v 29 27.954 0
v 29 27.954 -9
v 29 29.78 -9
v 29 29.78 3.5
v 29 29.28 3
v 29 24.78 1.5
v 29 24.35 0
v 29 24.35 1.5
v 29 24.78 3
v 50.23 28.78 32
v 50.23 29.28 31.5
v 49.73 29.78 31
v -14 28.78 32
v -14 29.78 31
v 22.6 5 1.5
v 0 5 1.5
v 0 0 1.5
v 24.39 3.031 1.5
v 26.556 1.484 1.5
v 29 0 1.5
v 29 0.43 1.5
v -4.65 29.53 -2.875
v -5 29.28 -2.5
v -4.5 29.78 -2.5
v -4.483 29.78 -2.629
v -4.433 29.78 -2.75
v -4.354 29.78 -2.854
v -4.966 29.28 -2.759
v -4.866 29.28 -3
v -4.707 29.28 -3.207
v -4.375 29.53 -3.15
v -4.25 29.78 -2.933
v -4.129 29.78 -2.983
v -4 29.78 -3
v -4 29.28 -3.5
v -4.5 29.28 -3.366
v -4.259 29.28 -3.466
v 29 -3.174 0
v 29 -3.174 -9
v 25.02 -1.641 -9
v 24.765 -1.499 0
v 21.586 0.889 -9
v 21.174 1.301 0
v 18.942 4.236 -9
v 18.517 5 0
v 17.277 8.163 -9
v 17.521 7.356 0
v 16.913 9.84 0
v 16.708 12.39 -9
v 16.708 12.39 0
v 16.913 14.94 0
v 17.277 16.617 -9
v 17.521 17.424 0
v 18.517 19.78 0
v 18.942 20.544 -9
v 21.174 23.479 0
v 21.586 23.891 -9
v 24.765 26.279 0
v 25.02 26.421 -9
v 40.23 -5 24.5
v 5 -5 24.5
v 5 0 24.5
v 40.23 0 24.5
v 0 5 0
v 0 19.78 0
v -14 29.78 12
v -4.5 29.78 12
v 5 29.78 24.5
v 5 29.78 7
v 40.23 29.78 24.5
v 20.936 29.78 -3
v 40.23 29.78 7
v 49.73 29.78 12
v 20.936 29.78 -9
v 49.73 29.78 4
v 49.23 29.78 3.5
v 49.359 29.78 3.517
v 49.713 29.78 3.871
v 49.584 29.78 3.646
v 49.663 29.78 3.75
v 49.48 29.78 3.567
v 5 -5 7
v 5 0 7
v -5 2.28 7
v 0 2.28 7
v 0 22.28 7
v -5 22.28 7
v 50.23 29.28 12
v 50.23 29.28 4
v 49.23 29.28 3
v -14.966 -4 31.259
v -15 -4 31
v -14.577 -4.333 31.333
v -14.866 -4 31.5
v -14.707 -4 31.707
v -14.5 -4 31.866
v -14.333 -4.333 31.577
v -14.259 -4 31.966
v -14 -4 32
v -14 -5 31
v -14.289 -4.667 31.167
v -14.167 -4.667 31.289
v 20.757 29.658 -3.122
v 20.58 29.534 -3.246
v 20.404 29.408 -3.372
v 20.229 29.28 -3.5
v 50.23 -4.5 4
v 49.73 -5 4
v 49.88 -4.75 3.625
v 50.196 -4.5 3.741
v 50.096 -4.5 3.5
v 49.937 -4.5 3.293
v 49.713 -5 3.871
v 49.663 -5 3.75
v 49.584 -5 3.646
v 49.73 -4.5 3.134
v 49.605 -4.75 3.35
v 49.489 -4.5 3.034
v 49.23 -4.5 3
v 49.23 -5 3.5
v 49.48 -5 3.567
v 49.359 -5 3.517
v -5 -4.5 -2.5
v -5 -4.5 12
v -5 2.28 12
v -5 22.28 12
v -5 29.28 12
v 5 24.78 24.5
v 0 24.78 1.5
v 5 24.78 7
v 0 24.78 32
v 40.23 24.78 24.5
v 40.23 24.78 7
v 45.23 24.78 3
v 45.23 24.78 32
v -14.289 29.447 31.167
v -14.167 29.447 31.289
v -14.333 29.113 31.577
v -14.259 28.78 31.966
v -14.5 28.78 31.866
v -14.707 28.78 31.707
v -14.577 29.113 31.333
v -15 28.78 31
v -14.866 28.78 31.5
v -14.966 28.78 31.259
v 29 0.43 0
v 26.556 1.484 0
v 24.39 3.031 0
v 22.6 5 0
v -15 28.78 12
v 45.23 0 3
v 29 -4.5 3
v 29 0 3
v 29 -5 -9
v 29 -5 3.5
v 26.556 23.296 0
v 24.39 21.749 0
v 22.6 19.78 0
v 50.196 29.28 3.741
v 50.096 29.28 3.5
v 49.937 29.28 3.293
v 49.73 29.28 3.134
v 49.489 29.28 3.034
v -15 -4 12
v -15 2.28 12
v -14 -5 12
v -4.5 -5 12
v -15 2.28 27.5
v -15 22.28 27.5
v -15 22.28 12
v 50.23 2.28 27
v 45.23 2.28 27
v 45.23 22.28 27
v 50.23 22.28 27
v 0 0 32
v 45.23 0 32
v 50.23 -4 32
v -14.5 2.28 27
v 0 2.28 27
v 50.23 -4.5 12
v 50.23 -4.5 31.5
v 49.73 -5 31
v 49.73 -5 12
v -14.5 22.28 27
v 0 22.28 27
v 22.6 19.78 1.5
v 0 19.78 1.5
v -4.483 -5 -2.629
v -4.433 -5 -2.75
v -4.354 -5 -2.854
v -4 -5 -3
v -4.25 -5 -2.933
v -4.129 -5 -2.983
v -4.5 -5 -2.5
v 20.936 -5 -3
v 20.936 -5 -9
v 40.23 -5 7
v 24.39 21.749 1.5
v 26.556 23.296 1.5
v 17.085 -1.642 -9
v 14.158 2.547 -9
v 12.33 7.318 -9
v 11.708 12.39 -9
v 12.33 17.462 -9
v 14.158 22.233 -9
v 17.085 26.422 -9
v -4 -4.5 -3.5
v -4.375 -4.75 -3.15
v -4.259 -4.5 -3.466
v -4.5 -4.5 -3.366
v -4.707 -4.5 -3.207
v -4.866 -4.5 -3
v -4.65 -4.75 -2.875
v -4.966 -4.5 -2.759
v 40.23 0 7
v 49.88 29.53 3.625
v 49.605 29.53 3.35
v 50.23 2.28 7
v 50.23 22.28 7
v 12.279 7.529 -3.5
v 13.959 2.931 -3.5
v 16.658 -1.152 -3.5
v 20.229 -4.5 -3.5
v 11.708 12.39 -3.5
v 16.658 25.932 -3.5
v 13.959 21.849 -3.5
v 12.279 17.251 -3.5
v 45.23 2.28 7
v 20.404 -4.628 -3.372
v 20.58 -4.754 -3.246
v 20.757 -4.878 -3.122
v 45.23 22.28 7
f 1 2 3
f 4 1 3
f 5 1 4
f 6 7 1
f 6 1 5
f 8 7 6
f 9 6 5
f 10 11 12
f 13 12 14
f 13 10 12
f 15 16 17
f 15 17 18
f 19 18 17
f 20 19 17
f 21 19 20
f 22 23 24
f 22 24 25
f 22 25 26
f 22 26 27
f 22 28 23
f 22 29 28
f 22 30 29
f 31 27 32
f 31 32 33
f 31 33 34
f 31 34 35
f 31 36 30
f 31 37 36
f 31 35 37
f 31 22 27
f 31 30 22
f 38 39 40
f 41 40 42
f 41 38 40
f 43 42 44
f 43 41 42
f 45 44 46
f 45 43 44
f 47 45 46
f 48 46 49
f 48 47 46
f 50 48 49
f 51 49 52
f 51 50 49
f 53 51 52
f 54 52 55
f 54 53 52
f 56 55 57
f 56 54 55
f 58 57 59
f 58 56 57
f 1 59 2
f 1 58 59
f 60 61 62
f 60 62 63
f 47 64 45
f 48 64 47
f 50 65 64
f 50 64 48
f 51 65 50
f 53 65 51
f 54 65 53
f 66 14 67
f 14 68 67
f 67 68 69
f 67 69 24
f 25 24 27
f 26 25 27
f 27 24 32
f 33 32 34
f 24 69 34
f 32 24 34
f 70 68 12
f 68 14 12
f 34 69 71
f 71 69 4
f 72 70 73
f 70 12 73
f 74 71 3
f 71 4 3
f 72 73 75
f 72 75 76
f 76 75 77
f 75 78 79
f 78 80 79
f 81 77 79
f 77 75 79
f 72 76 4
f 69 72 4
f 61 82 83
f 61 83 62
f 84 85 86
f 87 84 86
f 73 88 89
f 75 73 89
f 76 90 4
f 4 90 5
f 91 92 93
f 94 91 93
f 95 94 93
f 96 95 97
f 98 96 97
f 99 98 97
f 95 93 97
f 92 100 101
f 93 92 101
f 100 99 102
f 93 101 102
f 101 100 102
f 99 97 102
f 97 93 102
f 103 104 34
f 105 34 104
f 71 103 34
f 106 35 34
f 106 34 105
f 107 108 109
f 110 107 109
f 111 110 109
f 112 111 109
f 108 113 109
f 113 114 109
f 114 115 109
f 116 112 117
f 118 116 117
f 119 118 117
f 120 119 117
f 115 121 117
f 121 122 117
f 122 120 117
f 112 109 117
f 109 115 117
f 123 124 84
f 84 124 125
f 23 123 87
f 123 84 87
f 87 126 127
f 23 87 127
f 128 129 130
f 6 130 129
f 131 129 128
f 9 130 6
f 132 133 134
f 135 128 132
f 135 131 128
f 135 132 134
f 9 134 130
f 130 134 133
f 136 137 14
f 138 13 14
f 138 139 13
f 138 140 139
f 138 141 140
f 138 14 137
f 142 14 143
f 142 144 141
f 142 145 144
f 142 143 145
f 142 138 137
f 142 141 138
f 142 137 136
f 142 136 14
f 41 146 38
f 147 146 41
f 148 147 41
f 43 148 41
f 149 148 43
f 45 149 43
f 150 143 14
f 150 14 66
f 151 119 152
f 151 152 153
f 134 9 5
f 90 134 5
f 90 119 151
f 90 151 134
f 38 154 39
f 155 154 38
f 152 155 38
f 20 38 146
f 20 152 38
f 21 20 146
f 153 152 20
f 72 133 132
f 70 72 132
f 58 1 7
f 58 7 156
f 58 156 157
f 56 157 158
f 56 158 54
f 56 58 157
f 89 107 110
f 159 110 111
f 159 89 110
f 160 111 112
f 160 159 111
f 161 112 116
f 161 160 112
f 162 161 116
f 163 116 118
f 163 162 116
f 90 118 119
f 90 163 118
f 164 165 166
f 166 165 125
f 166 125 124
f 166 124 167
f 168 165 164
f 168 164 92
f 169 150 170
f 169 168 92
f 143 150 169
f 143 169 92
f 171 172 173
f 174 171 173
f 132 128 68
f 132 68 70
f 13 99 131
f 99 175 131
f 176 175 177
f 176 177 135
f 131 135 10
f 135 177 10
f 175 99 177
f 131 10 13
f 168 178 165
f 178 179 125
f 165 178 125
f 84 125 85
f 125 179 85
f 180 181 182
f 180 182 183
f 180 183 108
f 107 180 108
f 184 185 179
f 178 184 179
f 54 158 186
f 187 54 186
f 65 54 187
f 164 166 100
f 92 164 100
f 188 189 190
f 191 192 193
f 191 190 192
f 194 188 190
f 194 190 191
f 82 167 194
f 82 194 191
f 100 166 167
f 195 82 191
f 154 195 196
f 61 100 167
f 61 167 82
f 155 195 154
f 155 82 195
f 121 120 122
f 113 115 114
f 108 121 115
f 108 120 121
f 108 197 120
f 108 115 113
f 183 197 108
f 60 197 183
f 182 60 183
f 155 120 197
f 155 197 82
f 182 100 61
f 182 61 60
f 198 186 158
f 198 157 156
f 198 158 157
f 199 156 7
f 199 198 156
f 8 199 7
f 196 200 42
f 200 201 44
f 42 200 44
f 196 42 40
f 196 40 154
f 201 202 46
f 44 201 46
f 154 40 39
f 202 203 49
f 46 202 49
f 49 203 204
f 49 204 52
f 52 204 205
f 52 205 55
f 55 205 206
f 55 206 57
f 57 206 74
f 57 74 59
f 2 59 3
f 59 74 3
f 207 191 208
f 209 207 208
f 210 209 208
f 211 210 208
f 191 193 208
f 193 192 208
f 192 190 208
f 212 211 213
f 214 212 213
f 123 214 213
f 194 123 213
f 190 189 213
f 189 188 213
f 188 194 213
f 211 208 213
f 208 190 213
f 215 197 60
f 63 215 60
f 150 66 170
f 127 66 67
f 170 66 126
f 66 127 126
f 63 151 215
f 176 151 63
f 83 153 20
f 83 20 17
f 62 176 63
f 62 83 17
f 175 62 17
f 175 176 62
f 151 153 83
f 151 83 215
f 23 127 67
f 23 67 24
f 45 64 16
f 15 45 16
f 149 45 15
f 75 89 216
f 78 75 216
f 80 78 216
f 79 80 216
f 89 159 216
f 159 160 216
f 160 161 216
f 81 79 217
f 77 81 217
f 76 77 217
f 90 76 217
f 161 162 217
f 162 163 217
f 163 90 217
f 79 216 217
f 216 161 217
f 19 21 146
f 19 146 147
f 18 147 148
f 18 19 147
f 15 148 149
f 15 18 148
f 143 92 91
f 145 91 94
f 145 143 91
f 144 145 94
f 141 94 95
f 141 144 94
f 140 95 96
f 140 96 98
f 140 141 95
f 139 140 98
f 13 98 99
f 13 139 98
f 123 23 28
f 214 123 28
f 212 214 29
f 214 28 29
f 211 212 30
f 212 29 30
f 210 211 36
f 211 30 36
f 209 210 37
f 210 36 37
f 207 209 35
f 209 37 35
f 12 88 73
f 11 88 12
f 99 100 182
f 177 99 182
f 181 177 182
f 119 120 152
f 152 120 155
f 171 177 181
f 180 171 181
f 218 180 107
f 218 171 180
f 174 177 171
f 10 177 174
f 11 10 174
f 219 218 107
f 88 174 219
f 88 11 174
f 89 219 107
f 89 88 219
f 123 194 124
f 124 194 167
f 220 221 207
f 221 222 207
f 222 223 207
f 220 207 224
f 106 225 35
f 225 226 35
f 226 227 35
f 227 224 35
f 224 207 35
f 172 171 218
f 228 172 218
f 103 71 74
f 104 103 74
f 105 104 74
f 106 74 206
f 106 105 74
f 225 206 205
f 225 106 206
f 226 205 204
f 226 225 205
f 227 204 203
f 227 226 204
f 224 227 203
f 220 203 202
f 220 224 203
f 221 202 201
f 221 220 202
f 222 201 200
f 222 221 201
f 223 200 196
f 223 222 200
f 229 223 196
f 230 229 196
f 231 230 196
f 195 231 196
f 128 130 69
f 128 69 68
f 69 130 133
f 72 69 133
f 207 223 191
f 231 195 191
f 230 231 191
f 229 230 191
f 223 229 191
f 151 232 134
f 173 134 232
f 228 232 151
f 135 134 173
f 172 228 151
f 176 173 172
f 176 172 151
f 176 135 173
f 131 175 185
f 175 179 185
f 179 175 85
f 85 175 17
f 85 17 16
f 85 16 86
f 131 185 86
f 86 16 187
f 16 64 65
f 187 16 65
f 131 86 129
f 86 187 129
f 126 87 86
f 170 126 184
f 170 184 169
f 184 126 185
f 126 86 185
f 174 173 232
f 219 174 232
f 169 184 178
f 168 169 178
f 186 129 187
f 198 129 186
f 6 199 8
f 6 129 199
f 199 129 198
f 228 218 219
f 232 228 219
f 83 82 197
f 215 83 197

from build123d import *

# Parameters (mm, degrees)
SKETCH_1_W              = 45.23
SKETCH_1_H              = 24.78
EXTRUDE_1_DEPTH         = 35
CUT_EXTRUDE_1_DEPTH     = 3
SKETCH_5_W              = 1.897849624
SKETCH_5_H              = 24.78
CUT_EXTRUDE_3_DEPTH     = 3
EXTRUDE_2_DEPTH         = 17.9
EXTRUDE_2_DEPTH_BACK    = 18.6
EXTRUDE_2_START         = 17.5
SKETCH_3_R              = 3
SKETCH_4_W              = 30.897849624
SKETCH_4_H              = 5
CUT_EXTRUDE_2_DEPTH     = 1.5
SKETCH_6_W              = 10
SKETCH_6_H              = 18
CUT_EXTRUDE_4_DEPTH     = 1.5
SHELL_START             = -5
SHELL_12_DEPTH          = 5
SHELL_START_2           = 45.23
SHELL_12_2_OUTLINE_W    = 34.78
SHELL_12_2_OUTLINE_H    = 39
SHELL_12_2_DEPTH        = 5
SHELL_12_3_OUTLINE_W    = 34.78
SHELL_12_3_OUTLINE_H    = 1.5
SHELL_12_3_DEPTH        = 34
SHELL_12_4_OUTLINE_W    = 28
SHELL_12_4_OUTLINE_H    = 1.5
SHELL_12_4_DEPTH        = 20
SHELL_12_5_OUTLINE_W    = 45.23
SHELL_12_5_OUTLINE_H    = 39
SHELL_12_5_DEPTH        = 34.78
SHELL_START_3           = 3
SHELL_12_6_OUTLINE_W    = 45.23
SHELL_12_6_OUTLINE_H    = 24.78
SHELL_12_6_DEPTH        = 29
SHELL_START_4           = 1.5
SHELL_12_7_OUTLINE_R    = 3
SHELL_12_7_DEPTH        = 32
SHELL_12_8_OUTLINE_R    = 3
SHELL_12_8_OUTLINE_W    = 10
SHELL_12_8_OUTLINE_H    = 14.78
SHELL_12_8_DEPTH        = 35
SHELL_12_9_OUTLINE_W    = 5
SHELL_12_9_OUTLINE_H    = 14.78
SHELL_12_9_DEPTH        = 1.5
SHELL_START_5           = 33.5
SHELL_12_10_OUTLINE_W   = 10
SHELL_12_10_OUTLINE_H   = 1.585
SHELL_12_10_OUTLINE_H_2 = 1.635
SHELL_12_10_DEPTH       = 1.5
SHELL_START_6           = -1.1
SHELL_12_11_OUTLINE_R   = 3
SHELL_12_11_DEPTH       = 36.5
SHELL_START_7           = 37
SHELL_12_12_OUTLINE_R   = 8
SHELL_12_12_DEPTH       = 3.4
SHELL_START_8           = -6.1
SHELL_12_13_OUTLINE_R   = 8
SHELL_12_13_DEPTH       = 4.1
CUT_EXTRUDE_7_DEPTH     = 70.724538722
CUT_EXTRUDE_8_DEPTH     = 70.724538722
CUT_EXTRUDE_9_REACH     = 70.969
SKETCH_14_W             = 35.23
SKETCH_14_H             = 17.5
CUT_EXTRUDE_10_REACH    = 72.436
SKETCH_15_W             = 20
SKETCH_15_H             = 20
SKETCH_16_W             = 5
SKETCH_16_H             = 1.5
CUT_EXTRUDE_11_DEPTH    = 34.78
CUT_EXTRUDE_12_REACH    = 72.436
SKETCH_17_W             = 5
SKETCH_17_H             = 34.78
SKETCH_19_W             = 34
SKETCH_19_H             = 1.5
CUT_EXTRUDE_14_DEPTH    = 24.78
FILLET_3_R              = 1
EXTRUDE_3_DEPTH         = 10
EXTRUDE_4_DEPTH         = 10
FILLET_4_R              = 1
CHAMFER_3_SIZE          = 1
CHAMFER_4_SIZE          = 0.5
CUT_EXTRUDE_15_DEPTH    = 10
CHAMFER_5_SIZE          = 0.5
CUT_EXTRUDE_START       = -3.5
CUT_EXTRUDE_16_DEPTH    = 3.5
EXTRUDE_5_DEPTH         = 5.5
EXTRUDE_5_DEPTH_BACK    = 1


with BuildPart() as part:
    # 草图1 → 凸台-拉伸1 (new body)
    with BuildSketch(Plane.XY):
        with Locations((22.615, 12.39)):
            Rectangle(SKETCH_1_W, SKETCH_1_H)
    extrude(amount=EXTRUDE_1_DEPTH)

    # 草图2 → 切除-拉伸1 (cut)
    with BuildSketch(Plane.XY):
        with BuildLine():
            Line((45.23, 24.78), (30.897849624, 24.78))
            ThreePointArc((30.897849624, 24.78), (20.186819111, 12.39), (30.897849624, 0))
            Line((30.897849624, 0), (45.23, 0))
            Line((45.23, 0), (45.23, 24.78))
        make_face()
    cut_extrude_1 = extrude(amount=CUT_EXTRUDE_1_DEPTH, mode=Mode.SUBTRACT)

    # 草图5 → 切除-拉伸3 (cut)
    with BuildSketch(Plane.XY):
        with Locations((29.948924812, 12.39)):
            Rectangle(SKETCH_5_W, SKETCH_5_H)
    cut_extrude_3 = extrude(amount=CUT_EXTRUDE_3_DEPTH, mode=Mode.SUBTRACT)

    # 镜向1: 切除-拉伸1, 切除-拉伸3 across plane
    add(cut_extrude_1.mirror(Plane.XY.offset(17.5)), mode=Mode.SUBTRACT)
    add(cut_extrude_3.mirror(Plane.XY.offset(17.5)), mode=Mode.SUBTRACT)

    # 草图3 → 凸台-拉伸2 (add, two sides: drawn at the far end of the back side and taken through both)
    with BuildSketch(Plane.XY.offset(EXTRUDE_2_START - EXTRUDE_2_DEPTH_BACK)):
        with Locations((32.708409555, 12.39)):
            Circle(SKETCH_3_R)
    extrude(amount=EXTRUDE_2_DEPTH + EXTRUDE_2_DEPTH_BACK)

    # 草图4 → 切除-拉伸2 (cut)
    with BuildSketch(Plane.XY):
        with Locations((15.448924812, 22.28)):
            Rectangle(SKETCH_4_W, SKETCH_4_H)
        with Locations((15.448924812, 2.5)):
            Rectangle(SKETCH_4_W, SKETCH_4_H)
    extrude(amount=CUT_EXTRUDE_2_DEPTH, mode=Mode.SUBTRACT)

    # 草图6 → 切除-拉伸4 (cut)
    with BuildSketch(Plane.XY.offset(35)):
        with BuildLine():
            Line((29, 24.78), (0, 24.78))
            Line((0, 24.78), (0, 0))
            Line((0, 0), (29, 0))
            Line((29, 0), (29, 0.430153603))
            ThreePointArc((29, 0.430153603), (20.186819111, 12.39), (29, 24.349846397))
            Line((29, 24.349846397), (29, 24.78))
        make_face()
        with Locations((10, 12.365)):
            Rectangle(SKETCH_6_W, SKETCH_6_H, mode=Mode.SUBTRACT)
    extrude(amount=-CUT_EXTRUDE_4_DEPTH, mode=Mode.SUBTRACT)

    # 抽壳12: read off the stored shape, not the designer's step
    # 抽壳12 outline → 抽壳12 (add)
    with BuildSketch(Plane.YZ.offset(SHELL_START)):
        Polygon((0, -3.5), (0, -5), (24.78, -5), (24.78, -3.5), (29.78, -3.5), (29.78, 38.5), (-5, 38.5), (-5, -3.5), align=None)
    extrude(amount=SHELL_12_DEPTH)

    # Shell 12 2 outline → Shell 12 2 (add)
    with BuildSketch(Plane.YZ.offset(SHELL_START_2)):
        with Locations((12.39, 17.5)):
            Rectangle(SHELL_12_2_OUTLINE_W, SHELL_12_2_OUTLINE_H)
    extrude(amount=SHELL_12_2_DEPTH)

    # Shell 12 3 outline → Shell 12 3 (add)
    with BuildSketch(Plane.YZ):
        Polygon((0, -3.5), (0, -5), (24.78, -5), (24.78, -3.5), (29.78, -3.5), (29.78, -2), (-5, -2), (-5, -3.5), align=None)
        with Locations((12.39, 37.75)):
            Rectangle(SHELL_12_3_OUTLINE_W, SHELL_12_3_OUTLINE_H)
    extrude(amount=SHELL_12_3_DEPTH)

    # Shell 12 4 outline → Shell 12 4 (add)
    with BuildSketch(Plane.YZ):
        with Locations((12.365, 39.25)):
            Rectangle(SHELL_12_4_OUTLINE_W, SHELL_12_4_OUTLINE_H)
    extrude(amount=SHELL_12_4_DEPTH)

    # Shell 12 5 outline → Shell 12 5 (add)
    with BuildSketch(Plane(origin=(0, 0, 0), x_dir=(1, 0, 0), z_dir=(0, 1, 0)).offset(SHELL_START)):
        with Locations((22.615, -17.5)):
            Rectangle(SHELL_12_5_OUTLINE_W, SHELL_12_5_OUTLINE_H)
    extrude(amount=SHELL_12_5_DEPTH)

    # Shell 12 6 outline → Shell 12 6 (cut)
    with BuildSketch(Plane.XY.offset(SHELL_START_3)):
        with Locations((22.615, 12.39)):
            Rectangle(SHELL_12_6_OUTLINE_W, SHELL_12_6_OUTLINE_H)
    extrude(amount=SHELL_12_6_DEPTH, mode=Mode.SUBTRACT)

    # Shell 12 7 outline → Shell 12 7 (cut)
    with BuildSketch(Plane.XY.offset(SHELL_START_4)):
        with Locations((32.708409555, 12.39)):
            Circle(SHELL_12_7_OUTLINE_R)
        with BuildLine():
            Line((29, 24.349846397), (29, 24.78))
            Line((29, 24.78), (0, 24.78))
            Line((0, 24.78), (0, 0))
            Line((0, 0), (29, 0))
            Line((29, 0), (29, 0.430153603))
            ThreePointArc((29, 0.430153603), (20.186819111, 12.39), (29, 24.349846397))
        make_face()
    extrude(amount=SHELL_12_7_DEPTH, mode=Mode.SUBTRACT)

    # Shell 12 8 outline → Shell 12 8 (cut)
    with BuildSketch(Plane.XY):
        with Locations((32.708409555, 12.39)):
            Circle(SHELL_12_8_OUTLINE_R)
        with Locations((10, 12.39)):
            Rectangle(SHELL_12_8_OUTLINE_W, SHELL_12_8_OUTLINE_H)
    extrude(amount=SHELL_12_8_DEPTH, mode=Mode.SUBTRACT)

    # Shell 12 9 outline → Shell 12 9 (cut)
    with BuildSketch(Plane.XY):
        with Locations((2.5, 12.39)):
            Rectangle(SHELL_12_9_OUTLINE_W, SHELL_12_9_OUTLINE_H)
        with BuildLine():
            ThreePointArc((22.60008985, 5), (20.186819111, 12.39), (22.60008985, 19.78))
            Line((22.60008985, 19.78), (15, 19.78))
            Line((15, 19.78), (15, 5))
            Line((15, 5), (22.60008985, 5))
        make_face()
    extrude(amount=SHELL_12_9_DEPTH, mode=Mode.SUBTRACT)

    # Shell 12 10 outline → Shell 12 10 (cut)
    with BuildSketch(Plane.XY.offset(SHELL_START_5)):
        with Locations((10, 20.5725)):
            Rectangle(SHELL_12_10_OUTLINE_W, SHELL_12_10_OUTLINE_H)
        with Locations((10, 4.1825)):
            Rectangle(SHELL_12_10_OUTLINE_W, SHELL_12_10_OUTLINE_H_2)
    extrude(amount=SHELL_12_10_DEPTH, mode=Mode.SUBTRACT)

    # Shell 12 11 outline → Shell 12 11 (cut)
    with BuildSketch(Plane.XY.offset(SHELL_START_6)):
        with Locations((32.708409555, 12.39)):
            Circle(SHELL_12_11_OUTLINE_R)
    extrude(amount=SHELL_12_11_DEPTH, mode=Mode.SUBTRACT)

    # Shell 12 12 outline → Shell 12 12 (add)
    with BuildSketch(Plane.XY.offset(SHELL_START_7)):
        with Locations((32.708409555, 12.39)):
            Circle(SHELL_12_12_OUTLINE_R)
    extrude(amount=SHELL_12_12_DEPTH)

    # Shell 12 13 outline → Shell 12 13 (add)
    with BuildSketch(Plane.XY.offset(SHELL_START_8)):
        with Locations((32.708409555, 12.39)):
            Circle(SHELL_12_13_OUTLINE_R)
    extrude(amount=SHELL_12_13_DEPTH)

    # 草图12 → 切除-拉伸7 (cut, through all)
    with BuildSketch(Plane(origin=(0, 0, 32), x_dir=(-1, 0, 0), z_dir=(0, 0, -1))):
        Polygon((-50.23, 29.78), (-50.23, -5), (-34, -5), (5, -5), (5, 29.78), (-34, 29.78), align=None)
    extrude(amount=-CUT_EXTRUDE_7_DEPTH, mode=Mode.SUBTRACT)

    # 草图13 → 切除-拉伸8 (cut, through all)
    with BuildSketch(Plane(origin=(0, 0, 32), x_dir=(-1, 0, 0), z_dir=(0, 0, -1))):
        with BuildLine():
            Line((-45.23, 0), (-29, 0))
            Line((-29, 0), (-29, 0.430153603))
            ThreePointArc((-29, 0.430153603), (-20.186819111, 12.39), (-29, 24.349846397))
            Line((-29, 24.349846397), (-29, 24.78))
            Line((-29, 24.78), (-45.23, 24.78))
            Line((-45.23, 24.78), (-45.23, 0))
        make_face()
    extrude(amount=CUT_EXTRUDE_8_DEPTH, mode=Mode.SUBTRACT)

    # 切除-拉伸9: up to this face of the body (flat: up to its plane)
    cut_extrude_9_end = Plane(part.part.faces().sort_by_distance((22.369830038, 29.78, 14.463737915))[0])
    # 草图14 → 切除-拉伸9 (cut, up to the picked face)
    with BuildSketch(Plane.XZ.offset(5), mode=Mode.PRIVATE) as cut_extrude_9_sk1:
        with Locations((22.615, 15.75)):
            Rectangle(SKETCH_14_W, SKETCH_14_H)
    cut_extrude_9_tool1 = split(extrude(cut_extrude_9_sk1.sketch, amount=-CUT_EXTRUDE_9_REACH, mode=Mode.PRIVATE), bisect_by=cut_extrude_9_end, keep=Keep.BOTH, mode=Mode.PRIVATE)
    add(cut_extrude_9_tool1.solids().sort_by(Axis((22.615, -5, 15.75), (0, 1, 0)))[0], mode=Mode.SUBTRACT)

    # 切除-拉伸10: up to this face of the body (flat: up to its plane)
    cut_extrude_10_end = Plane(part.part.faces().sort_by_distance((-5, 12.39, 13.709339078))[0])
    # 草图15 → 切除-拉伸10 (cut, up to the picked face)
    with BuildSketch(Plane(origin=(50.23, 0, 0), x_dir=(0, 0, -1), z_dir=(1, 0, 0)), mode=Mode.PRIVATE) as cut_extrude_10_sk1:
        with Locations((-17, 12.28)):
            Rectangle(SKETCH_15_W, SKETCH_15_H)
    cut_extrude_10_tool1 = split(extrude(cut_extrude_10_sk1.sketch, amount=-CUT_EXTRUDE_10_REACH, mode=Mode.PRIVATE), bisect_by=cut_extrude_10_end, keep=Keep.BOTH, mode=Mode.PRIVATE)
    add(cut_extrude_10_tool1.solids().sort_by(Axis((50.23, 12.28, 17), (-1, 0, 0)))[0], mode=Mode.SUBTRACT)

    # 草图16 → 切除-拉伸11 (cut)
    with BuildSketch(Plane.XZ.offset(5)):
        with Locations((31.5, -2.75)):
            Rectangle(SKETCH_16_W, SKETCH_16_H)
    extrude(amount=-CUT_EXTRUDE_11_DEPTH, mode=Mode.SUBTRACT)

    # 切除-拉伸12: up to this face of the body (flat: up to its plane)
    cut_extrude_12_end = Plane(part.part.faces().sort_by_distance((29, -1.762689237, -2.47843834))[0])
    # 草图17 → 切除-拉伸12 (cut, up to the picked face)
    with BuildSketch(Plane(origin=(50.23, 0, 0), x_dir=(0, 0, -1), z_dir=(1, 0, 0)), mode=Mode.PRIVATE) as cut_extrude_12_sk1:
        with Locations((-0.5, 12.39)):
            Rectangle(SKETCH_17_W, SKETCH_17_H)
    cut_extrude_12_tool1 = split(extrude(cut_extrude_12_sk1.sketch, amount=-CUT_EXTRUDE_12_REACH, mode=Mode.PRIVATE), bisect_by=cut_extrude_12_end, keep=Keep.BOTH, mode=Mode.PRIVATE)
    add(cut_extrude_12_tool1.solids().sort_by(Axis((50.23, 12.39, 0.5), (-1, 0, 0)))[0], mode=Mode.SUBTRACT)

    # 草图19 → 切除-拉伸14 (cut)
    with BuildSketch(Plane(origin=(0, 24.78, 0), x_dir=(1, 0, 0), z_dir=(0, 1, 0))):
        with Locations((12, 4.25)):
            Rectangle(SKETCH_19_W, SKETCH_19_H)
    extrude(amount=-CUT_EXTRUDE_14_DEPTH, mode=Mode.SUBTRACT)

    # 圆角3
    fillet_3_edges = [part.edges().sort_by_distance(p)[0] for p in [
        (-5, 12.39, -3.5),
        (50.23, 12.39, 3),
    ]]
    fillet(fillet_3_edges, radius=FILLET_3_R)

    # 草图20 → 凸台-拉伸3 (add)
    with BuildSketch(Plane(origin=(50.23, 0, 0), x_dir=(0, 0, -1), z_dir=(1, 0, 0))):
        Polygon((-12, 22.28), (-12, 29.78), (-32, 29.78), (-32, -5), (-12, -5), (-12, 2.28), (-27, 2.28), (-27, 22.28), align=None)
    extrude(amount=EXTRUDE_3_DEPTH)

    # 草图22 → 凸台-拉伸4 (add)
    with BuildSketch(Plane.ZY.offset(5)):
        Polygon((32, 29.78), (12, 29.78), (12, 22.28), (27, 22.28), (27, 2.28), (12, 2.28), (12, -5), (32, -5), align=None)
    extrude(amount=EXTRUDE_4_DEPTH)

    # 圆角4
    fillet_4_edges = [part.edges().sort_by_distance(p)[0] for p in [
        (60.23, 12.39, 32),
        (-15, 12.39, 32),
    ]]
    fillet(fillet_4_edges, radius=FILLET_4_R)

    # 倒角3
    chamfer_3_edges = [part.edges().sort_by_distance(p)[0] for p in [
        (60.23, 29.78, 21.5),
        (-15, -5, 21.5),
        (-15, 29.78, 21.5),
        (22.615, 29.78, 32),
        (22.615, -5, 32),
        (60.23, -5, 21.5),
    ]]
    chamfer(chamfer_3_edges, length=CHAMFER_3_SIZE - 0.0001)  # a hair under: the kernel refuses the full size

    # 倒角4
    chamfer_4_edges = [part.edges().sort_by_distance(p)[0] for p in [
        (12.5, 29.78, -3.5),
        (39.115, -5, 3),
        (39.115, 29.78, 3),
        (12.5, -5, -3.5),
        (49.937106781, -5, 3.292893219),
        (-4.707106781, -5, -3.207106781),
        (49.937106781, 29.78, 3.292893219),
        (-4.707106781, 29.78, -3.207106781),
        (50.23, -5, 8),
        (50.23, 29.78, 8),
        (60.23, 12.28, 27),
        (-5, 29.78, 4.75),
        (-5, -5, 4.75),
        (-15, 12.28, 27),
    ]]
    chamfer(chamfer_4_edges, length=CHAMFER_4_SIZE)

    # 草图23 → 切除-拉伸15 (cut)
    with BuildSketch(Plane(origin=(50.23, 0, 0), x_dir=(0, 0, -1), z_dir=(1, 0, 0))):
        Polygon((-12, 29.78), (-32, 29.78), (-32, -5.874790902), (-12, -5.874790902), (-12, -4.5), (-12, 2.28), (-12, 22.28), (-12, 29.28), align=None)
    extrude(amount=CUT_EXTRUDE_15_DEPTH, mode=Mode.SUBTRACT)

    # 倒角5
    chamfer_5_edges = [part.edges().sort_by_distance(p)[0] for p in [
        (50.23, -5, 21.50005),
        (50.23, 29.78, 21.50005),
    ]]
    chamfer(chamfer_5_edges, length=CHAMFER_5_SIZE - 0.0001)  # a hair under: the kernel refuses the full size

    # 草图24 → 切除-拉伸16 (cut)
    with BuildSketch(Plane(origin=(0, 0, -3.5), x_dir=(-1, 0, 0), z_dir=(0, 0, -1)).offset(CUT_EXTRUDE_START)):
        with BuildLine():
            Line((-29, 27.954308484), (-29, 24.349846397))
            ThreePointArc((-29, 24.349846397), (-20.186819111, 12.39), (-29, 0.430153603))
            Line((-29, 0.430153603), (-29, -3.174308484))
            ThreePointArc((-29, -3.174308484), (-20.151846473, 2.473714226), (-16.708409555, 12.39))
            ThreePointArc((-16.708409555, 12.39), (-20.151846473, 22.306285774), (-29, 27.954308484))
        make_face()
    extrude(amount=CUT_EXTRUDE_16_DEPTH, mode=Mode.SUBTRACT)

    # 草图25 → 凸台-拉伸5 (add, two sides: drawn at the far end of the back side and taken through both)
    with BuildSketch(Plane(origin=(0, 0, -3.5), x_dir=(-1, 0, 0), z_dir=(0, 0, -1)).offset(-EXTRUDE_5_DEPTH_BACK)):
        with BuildLine():
            Line((-29, 27.954308484), (-29, 29.78))
            Line((-29, 29.78), (-20.936073339, 29.78))
            ThreePointArc((-20.936073339, 29.78), (-11.708409555, 12.39), (-20.936073339, -5))
            Line((-20.936073339, -5), (-29, -5))
            Line((-29, -5), (-29, -3.174308484))
            ThreePointArc((-29, -3.174308484), (-16.708409555, 12.39), (-29, 27.954308484))
        make_face()
    extrude(amount=EXTRUDE_5_DEPTH + EXTRUDE_5_DEPTH_BACK)


solid = part.part
